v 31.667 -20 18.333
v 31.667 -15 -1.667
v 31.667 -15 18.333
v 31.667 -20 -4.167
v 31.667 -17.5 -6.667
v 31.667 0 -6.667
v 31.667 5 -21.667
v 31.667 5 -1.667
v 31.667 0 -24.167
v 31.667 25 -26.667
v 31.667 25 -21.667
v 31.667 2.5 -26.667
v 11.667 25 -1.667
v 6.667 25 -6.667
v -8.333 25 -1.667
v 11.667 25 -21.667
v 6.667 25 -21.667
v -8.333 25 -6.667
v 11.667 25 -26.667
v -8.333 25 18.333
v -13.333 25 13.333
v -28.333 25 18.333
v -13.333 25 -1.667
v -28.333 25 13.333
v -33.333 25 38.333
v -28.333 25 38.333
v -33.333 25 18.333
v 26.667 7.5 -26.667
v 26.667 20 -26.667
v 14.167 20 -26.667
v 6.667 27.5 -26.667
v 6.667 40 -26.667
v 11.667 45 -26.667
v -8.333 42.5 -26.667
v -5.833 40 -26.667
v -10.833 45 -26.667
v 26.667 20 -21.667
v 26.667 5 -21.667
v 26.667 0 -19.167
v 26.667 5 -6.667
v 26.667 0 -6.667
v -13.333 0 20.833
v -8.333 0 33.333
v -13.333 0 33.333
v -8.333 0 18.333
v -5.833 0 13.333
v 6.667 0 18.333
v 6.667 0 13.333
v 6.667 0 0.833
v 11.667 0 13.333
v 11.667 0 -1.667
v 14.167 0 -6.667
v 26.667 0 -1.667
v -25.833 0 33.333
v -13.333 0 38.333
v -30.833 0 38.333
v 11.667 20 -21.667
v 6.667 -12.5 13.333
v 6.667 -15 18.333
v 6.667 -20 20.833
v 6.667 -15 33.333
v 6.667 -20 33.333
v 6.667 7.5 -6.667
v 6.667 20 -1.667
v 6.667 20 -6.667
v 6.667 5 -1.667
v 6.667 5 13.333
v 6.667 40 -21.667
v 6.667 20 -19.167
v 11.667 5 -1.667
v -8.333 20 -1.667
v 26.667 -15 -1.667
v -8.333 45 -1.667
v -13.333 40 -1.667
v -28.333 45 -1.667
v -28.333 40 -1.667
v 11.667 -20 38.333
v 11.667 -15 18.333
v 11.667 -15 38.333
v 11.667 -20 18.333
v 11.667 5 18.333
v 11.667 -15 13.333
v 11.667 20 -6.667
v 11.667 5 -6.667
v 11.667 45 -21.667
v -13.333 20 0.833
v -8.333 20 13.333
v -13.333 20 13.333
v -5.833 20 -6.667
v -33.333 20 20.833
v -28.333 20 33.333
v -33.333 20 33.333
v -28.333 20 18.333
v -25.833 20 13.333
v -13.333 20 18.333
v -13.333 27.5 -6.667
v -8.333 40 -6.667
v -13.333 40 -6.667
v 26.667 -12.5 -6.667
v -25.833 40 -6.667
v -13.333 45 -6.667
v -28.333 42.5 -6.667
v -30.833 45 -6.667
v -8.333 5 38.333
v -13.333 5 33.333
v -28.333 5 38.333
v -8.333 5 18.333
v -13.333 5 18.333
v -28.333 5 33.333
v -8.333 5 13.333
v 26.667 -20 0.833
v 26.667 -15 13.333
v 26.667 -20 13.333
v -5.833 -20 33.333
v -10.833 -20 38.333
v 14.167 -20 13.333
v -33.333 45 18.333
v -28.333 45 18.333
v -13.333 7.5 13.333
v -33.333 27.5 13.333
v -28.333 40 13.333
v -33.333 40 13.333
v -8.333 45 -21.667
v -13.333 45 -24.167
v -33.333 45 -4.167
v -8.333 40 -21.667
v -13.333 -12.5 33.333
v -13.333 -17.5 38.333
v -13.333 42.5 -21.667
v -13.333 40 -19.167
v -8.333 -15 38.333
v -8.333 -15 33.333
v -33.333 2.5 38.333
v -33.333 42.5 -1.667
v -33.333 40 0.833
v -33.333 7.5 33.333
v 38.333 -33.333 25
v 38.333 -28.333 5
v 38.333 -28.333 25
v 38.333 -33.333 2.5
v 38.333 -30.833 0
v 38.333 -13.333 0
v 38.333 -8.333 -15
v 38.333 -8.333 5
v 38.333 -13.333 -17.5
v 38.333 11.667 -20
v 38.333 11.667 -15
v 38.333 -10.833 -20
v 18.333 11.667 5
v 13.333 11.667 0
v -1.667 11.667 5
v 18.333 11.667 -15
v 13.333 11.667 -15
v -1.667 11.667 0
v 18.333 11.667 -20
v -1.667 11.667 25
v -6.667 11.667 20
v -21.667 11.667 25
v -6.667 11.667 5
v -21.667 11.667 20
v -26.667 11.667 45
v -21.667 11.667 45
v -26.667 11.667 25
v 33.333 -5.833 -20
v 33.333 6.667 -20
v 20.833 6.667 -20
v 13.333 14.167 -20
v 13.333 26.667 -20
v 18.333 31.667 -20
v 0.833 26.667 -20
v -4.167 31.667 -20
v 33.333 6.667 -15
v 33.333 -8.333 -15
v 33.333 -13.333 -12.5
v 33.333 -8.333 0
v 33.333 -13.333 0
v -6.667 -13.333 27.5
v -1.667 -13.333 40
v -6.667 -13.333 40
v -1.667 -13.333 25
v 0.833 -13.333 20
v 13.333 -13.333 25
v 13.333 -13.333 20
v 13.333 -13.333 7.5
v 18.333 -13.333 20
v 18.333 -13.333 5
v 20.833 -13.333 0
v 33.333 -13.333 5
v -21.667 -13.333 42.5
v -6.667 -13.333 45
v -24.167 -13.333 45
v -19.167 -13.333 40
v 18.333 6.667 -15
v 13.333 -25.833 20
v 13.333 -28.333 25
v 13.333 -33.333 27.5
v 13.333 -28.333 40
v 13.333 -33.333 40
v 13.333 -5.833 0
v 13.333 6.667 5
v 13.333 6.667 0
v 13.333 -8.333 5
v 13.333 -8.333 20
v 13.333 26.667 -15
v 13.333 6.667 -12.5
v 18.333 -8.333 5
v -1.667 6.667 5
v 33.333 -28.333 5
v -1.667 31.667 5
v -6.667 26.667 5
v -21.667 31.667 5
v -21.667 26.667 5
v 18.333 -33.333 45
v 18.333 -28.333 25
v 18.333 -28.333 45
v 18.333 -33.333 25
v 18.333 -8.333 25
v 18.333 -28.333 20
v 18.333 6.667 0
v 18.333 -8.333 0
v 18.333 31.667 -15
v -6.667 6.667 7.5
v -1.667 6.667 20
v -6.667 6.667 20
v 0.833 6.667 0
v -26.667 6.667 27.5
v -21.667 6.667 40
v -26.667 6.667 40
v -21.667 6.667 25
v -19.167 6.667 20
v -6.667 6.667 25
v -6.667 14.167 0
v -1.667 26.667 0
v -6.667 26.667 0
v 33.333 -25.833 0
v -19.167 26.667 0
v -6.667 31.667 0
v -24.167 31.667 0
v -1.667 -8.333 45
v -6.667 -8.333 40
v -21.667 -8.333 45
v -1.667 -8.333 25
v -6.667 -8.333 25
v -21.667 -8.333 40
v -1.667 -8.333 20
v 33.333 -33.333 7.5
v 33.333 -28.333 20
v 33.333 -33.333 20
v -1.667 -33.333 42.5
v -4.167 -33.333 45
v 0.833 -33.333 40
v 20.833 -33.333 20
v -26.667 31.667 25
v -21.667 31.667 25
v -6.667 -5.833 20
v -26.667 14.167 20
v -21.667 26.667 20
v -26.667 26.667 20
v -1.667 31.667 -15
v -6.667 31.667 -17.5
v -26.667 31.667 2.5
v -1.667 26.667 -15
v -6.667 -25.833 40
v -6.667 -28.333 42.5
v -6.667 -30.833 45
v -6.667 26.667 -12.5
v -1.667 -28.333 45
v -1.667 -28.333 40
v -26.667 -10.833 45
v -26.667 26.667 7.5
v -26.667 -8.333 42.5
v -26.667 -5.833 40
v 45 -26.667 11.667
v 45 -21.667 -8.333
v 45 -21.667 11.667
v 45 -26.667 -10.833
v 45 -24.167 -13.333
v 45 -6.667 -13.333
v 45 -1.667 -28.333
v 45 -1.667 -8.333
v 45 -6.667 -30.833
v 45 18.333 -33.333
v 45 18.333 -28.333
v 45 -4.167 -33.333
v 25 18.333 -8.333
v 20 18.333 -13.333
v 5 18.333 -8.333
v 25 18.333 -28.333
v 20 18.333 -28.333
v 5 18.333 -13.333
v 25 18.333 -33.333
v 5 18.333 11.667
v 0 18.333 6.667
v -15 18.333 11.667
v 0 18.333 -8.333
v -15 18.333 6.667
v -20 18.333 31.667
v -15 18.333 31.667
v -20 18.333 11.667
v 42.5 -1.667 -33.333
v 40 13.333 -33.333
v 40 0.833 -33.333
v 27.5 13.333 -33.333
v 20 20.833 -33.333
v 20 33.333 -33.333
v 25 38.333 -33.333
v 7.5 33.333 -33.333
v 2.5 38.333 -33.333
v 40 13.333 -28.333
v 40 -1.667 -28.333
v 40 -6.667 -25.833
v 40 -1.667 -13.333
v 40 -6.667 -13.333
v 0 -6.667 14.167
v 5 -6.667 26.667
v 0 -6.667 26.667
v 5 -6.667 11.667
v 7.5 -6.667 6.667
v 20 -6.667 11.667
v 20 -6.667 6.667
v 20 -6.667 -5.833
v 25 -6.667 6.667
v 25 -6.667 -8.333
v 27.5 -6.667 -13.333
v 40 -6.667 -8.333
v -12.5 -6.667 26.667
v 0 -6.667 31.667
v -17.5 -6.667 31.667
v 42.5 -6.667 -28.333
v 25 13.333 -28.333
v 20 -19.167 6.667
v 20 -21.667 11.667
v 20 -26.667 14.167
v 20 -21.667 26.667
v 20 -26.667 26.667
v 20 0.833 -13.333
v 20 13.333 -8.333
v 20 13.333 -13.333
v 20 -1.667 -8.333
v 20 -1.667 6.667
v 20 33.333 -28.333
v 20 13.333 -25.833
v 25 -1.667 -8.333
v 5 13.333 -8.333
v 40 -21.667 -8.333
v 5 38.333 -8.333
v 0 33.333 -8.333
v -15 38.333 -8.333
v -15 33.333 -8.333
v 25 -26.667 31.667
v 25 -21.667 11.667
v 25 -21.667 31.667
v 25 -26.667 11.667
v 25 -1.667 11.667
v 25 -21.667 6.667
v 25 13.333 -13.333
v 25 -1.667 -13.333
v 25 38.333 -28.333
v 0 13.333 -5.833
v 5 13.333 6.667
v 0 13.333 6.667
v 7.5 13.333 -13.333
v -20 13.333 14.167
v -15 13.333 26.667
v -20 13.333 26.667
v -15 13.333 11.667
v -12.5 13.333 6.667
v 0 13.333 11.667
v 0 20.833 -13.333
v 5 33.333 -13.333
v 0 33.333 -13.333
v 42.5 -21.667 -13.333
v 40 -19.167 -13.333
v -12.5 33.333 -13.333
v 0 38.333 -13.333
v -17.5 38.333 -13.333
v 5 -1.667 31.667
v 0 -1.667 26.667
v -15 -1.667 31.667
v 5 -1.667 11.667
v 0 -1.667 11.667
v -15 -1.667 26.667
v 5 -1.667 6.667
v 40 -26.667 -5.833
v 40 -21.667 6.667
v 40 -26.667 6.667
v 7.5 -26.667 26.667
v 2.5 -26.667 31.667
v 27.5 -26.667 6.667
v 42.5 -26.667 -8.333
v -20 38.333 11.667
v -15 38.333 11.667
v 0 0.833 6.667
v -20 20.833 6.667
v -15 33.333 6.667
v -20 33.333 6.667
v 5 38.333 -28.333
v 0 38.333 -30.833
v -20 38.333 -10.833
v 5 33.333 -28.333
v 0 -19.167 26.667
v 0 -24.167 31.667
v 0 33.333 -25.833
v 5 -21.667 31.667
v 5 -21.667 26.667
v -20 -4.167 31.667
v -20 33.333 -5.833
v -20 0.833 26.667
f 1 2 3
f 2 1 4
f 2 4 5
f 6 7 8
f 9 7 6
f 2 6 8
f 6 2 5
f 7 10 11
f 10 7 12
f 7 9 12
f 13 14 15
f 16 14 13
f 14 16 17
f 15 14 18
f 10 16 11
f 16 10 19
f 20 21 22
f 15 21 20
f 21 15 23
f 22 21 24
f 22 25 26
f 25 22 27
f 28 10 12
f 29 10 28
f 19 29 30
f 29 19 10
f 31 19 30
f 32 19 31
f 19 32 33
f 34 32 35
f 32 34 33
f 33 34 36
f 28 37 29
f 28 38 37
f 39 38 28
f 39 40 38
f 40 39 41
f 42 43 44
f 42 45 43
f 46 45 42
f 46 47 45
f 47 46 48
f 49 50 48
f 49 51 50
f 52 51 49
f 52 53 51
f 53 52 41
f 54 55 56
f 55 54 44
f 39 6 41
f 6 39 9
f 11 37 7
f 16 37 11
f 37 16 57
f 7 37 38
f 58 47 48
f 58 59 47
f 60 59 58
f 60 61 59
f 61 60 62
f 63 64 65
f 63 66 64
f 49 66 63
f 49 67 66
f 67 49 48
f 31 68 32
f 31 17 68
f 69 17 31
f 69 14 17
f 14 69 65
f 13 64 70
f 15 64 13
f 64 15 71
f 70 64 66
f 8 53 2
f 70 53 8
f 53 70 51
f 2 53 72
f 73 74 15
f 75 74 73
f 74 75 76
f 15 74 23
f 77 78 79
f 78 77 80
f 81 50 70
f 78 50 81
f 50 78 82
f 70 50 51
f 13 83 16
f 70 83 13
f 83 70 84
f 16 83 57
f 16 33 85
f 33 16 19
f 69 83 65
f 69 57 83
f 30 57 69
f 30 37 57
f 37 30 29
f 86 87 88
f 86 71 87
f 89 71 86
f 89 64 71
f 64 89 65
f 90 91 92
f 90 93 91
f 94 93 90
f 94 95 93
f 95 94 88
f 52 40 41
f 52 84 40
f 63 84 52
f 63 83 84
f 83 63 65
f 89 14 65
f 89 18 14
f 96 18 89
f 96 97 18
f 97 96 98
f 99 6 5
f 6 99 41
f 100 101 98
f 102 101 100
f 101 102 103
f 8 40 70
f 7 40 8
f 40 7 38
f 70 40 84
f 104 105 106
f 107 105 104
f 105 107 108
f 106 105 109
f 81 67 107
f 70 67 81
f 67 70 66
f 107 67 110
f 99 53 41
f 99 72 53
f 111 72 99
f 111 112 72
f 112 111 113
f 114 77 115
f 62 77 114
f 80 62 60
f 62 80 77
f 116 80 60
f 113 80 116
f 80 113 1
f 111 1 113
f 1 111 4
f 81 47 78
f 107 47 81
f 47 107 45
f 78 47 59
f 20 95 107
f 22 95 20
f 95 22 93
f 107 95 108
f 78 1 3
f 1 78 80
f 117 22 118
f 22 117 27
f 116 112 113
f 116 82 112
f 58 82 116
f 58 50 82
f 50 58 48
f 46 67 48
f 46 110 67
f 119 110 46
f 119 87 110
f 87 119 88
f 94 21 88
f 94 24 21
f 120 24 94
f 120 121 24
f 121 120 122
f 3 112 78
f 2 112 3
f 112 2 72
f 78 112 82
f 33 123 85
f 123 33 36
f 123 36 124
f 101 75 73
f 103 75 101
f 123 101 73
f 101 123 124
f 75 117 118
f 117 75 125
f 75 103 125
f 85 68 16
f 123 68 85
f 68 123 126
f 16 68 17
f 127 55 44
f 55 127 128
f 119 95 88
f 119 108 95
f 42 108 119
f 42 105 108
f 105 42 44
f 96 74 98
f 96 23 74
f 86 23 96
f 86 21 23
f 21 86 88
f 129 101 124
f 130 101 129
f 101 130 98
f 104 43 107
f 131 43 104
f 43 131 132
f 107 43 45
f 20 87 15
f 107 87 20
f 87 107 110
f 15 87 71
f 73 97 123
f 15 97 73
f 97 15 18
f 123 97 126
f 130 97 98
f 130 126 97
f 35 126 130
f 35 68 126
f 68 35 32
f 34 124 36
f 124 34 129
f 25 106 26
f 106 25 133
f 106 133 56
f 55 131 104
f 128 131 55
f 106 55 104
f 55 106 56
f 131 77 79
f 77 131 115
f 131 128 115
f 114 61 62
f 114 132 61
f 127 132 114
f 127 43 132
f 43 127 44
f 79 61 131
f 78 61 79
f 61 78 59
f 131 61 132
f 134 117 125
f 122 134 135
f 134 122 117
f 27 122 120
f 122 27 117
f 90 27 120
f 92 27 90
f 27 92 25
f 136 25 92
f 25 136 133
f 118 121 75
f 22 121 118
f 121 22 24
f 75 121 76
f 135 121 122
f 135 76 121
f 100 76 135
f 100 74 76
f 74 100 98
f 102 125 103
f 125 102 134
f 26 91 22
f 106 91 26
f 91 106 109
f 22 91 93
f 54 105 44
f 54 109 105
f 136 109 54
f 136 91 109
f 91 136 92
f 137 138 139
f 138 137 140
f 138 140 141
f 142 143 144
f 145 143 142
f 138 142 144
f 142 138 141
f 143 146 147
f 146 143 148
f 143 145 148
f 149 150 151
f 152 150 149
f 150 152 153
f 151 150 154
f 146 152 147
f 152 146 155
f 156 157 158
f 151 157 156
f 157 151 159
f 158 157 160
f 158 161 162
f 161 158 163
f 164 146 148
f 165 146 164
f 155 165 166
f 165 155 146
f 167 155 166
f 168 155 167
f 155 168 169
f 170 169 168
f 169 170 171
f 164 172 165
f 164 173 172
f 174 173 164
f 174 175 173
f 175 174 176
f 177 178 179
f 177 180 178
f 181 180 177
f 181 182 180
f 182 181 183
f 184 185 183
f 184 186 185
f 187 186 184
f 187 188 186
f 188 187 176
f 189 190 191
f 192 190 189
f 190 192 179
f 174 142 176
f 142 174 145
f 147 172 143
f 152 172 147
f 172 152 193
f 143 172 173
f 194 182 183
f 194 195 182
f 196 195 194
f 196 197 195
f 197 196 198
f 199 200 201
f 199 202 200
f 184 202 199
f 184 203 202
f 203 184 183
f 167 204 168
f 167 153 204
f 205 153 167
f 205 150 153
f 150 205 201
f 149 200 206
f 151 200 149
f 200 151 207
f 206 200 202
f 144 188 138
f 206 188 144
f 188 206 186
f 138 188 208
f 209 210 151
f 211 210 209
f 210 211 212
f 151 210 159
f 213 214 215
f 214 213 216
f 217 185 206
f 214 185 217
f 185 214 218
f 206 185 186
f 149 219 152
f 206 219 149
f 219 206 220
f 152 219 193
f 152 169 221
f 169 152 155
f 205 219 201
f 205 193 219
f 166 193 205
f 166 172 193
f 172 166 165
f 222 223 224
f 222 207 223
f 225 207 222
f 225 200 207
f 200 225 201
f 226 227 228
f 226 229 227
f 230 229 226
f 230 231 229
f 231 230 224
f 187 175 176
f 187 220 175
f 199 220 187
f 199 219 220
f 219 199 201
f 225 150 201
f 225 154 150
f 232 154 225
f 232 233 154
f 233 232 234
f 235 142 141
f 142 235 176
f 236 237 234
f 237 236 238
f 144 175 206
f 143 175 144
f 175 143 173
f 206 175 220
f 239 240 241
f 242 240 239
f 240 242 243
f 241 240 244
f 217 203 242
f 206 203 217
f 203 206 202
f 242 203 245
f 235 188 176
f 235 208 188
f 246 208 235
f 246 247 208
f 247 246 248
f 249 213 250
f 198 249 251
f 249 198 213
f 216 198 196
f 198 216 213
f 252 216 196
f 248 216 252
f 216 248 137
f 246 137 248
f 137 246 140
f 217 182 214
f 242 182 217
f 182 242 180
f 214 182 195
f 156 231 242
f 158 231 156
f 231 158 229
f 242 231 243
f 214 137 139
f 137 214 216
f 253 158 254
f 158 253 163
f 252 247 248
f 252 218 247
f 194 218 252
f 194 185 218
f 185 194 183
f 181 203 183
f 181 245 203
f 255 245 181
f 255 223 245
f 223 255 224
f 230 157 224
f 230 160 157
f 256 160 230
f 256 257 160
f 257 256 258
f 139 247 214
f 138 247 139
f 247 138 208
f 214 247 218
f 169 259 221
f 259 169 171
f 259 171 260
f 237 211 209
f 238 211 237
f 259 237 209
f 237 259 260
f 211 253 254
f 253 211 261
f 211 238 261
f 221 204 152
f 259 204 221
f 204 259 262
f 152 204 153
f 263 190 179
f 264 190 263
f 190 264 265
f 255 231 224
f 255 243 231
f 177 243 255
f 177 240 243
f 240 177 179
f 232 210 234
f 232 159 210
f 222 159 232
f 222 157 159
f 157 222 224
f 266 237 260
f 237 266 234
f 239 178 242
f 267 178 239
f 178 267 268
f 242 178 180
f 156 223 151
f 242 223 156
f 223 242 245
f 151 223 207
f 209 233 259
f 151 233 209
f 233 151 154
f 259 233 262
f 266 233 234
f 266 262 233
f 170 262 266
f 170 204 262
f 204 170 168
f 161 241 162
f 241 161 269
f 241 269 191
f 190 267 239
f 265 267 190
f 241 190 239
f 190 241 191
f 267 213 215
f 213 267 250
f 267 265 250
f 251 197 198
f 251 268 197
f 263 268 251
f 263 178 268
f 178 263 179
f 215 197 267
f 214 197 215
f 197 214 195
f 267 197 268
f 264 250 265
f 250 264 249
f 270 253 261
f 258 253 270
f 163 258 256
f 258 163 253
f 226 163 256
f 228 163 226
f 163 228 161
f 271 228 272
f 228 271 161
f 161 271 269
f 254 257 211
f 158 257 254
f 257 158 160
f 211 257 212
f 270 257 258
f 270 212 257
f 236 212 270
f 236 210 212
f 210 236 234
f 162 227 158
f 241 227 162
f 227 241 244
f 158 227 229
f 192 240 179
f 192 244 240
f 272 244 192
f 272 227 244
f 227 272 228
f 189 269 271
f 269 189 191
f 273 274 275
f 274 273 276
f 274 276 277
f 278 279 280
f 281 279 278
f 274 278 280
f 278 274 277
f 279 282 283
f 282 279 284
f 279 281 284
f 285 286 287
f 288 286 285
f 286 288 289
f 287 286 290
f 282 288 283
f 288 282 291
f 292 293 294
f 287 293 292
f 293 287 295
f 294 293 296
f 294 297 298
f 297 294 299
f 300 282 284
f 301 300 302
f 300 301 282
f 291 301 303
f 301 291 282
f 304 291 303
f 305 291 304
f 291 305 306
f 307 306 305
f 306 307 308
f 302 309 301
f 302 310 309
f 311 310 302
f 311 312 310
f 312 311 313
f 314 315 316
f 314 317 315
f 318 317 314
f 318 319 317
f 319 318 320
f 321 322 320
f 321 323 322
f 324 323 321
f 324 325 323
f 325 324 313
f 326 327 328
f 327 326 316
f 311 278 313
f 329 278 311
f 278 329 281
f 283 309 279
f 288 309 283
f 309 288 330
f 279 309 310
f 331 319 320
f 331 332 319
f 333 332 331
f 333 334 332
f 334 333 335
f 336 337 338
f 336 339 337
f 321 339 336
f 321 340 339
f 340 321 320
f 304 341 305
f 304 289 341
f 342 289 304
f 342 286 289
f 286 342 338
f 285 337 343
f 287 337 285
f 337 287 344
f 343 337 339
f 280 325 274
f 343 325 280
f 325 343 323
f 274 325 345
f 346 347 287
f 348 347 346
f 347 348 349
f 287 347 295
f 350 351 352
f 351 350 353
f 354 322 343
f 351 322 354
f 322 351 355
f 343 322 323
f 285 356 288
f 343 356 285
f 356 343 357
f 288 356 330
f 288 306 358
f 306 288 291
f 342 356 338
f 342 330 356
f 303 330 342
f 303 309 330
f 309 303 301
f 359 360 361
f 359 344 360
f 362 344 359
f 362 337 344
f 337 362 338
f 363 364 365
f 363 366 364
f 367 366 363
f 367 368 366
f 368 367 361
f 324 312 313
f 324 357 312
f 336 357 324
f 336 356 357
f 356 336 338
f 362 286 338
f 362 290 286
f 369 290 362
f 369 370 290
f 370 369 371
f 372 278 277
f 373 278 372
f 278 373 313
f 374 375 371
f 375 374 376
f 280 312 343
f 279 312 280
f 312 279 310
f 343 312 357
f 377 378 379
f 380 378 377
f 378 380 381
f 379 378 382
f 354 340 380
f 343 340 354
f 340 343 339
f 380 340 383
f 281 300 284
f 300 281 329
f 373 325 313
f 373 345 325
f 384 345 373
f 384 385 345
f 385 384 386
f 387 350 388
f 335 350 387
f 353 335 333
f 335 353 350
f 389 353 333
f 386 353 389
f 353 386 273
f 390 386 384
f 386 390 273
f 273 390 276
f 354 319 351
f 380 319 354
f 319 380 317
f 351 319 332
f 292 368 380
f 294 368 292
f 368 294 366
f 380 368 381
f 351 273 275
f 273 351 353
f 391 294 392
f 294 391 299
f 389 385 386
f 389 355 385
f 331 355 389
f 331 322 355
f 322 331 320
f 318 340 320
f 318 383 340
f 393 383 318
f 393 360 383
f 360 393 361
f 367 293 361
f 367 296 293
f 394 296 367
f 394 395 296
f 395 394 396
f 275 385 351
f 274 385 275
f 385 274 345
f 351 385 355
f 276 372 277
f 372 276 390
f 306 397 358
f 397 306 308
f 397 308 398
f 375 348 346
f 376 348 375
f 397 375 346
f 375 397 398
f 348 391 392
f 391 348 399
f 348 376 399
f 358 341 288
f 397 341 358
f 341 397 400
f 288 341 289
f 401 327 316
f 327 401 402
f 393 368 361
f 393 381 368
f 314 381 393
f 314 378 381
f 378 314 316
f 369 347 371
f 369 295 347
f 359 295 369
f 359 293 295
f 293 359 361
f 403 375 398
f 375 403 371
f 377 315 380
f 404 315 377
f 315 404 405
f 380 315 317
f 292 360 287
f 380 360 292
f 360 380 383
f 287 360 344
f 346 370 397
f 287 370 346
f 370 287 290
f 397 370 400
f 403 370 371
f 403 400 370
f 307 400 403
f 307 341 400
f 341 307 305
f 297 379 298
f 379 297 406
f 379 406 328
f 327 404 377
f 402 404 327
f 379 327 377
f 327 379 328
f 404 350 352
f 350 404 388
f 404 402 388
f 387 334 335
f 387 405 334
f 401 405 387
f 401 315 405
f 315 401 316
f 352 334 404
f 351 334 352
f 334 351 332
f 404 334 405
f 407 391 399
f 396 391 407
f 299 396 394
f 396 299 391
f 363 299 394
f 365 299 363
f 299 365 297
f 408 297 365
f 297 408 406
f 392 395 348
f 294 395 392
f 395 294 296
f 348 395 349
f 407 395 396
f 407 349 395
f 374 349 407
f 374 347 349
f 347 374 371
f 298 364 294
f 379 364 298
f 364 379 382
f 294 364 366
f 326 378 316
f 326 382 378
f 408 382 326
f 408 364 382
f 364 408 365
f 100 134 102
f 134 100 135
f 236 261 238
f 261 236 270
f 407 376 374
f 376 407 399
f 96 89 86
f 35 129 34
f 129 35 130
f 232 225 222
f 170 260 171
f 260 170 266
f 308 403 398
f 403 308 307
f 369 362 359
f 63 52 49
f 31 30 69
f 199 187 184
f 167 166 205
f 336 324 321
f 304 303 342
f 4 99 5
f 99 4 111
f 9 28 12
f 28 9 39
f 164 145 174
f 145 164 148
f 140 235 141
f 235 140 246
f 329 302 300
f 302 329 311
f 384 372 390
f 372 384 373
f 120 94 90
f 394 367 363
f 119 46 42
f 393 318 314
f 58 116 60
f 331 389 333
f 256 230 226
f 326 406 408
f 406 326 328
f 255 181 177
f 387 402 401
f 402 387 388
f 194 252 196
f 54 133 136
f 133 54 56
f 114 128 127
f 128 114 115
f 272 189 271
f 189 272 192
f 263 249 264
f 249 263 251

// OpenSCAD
count=1;
thickness = 5;
spacing = 20;

module drawcubes(list, spacing=spacing, thickness=thickness){
    for(xyz12=list){
        xyz0=xyz12[0]*spacing;
        xyz1=xyz12[1]*spacing;
        hull(){
            translate([xyz0.x, xyz0.y, xyz0.z])
                cube(thickness, center=true);
            translate([xyz1.x, xyz1.y, xyz1.z])
                cube(thickness, center=true);
        }
    }
}
module ring(){
    difference(){
        drawcubes([
            [[1,1,0],[1,0,0]],
            [[0,1,1],[0,1,0]],
            [[1,0,1],[0,0,1]],
            [[1,0,1],[1,0,0]],
            [[1,1,0],[0,1,0]],
            [[0,1,1],[0,0,1]],
        ]);
        translate([-1,-1,-1]*(spacing/3+thickness/2)) hull(){
            translate([-2,2,2]*(spacing)) cube(thickness, center=true);
            translate([2,-2,2]*(spacing)) cube(thickness, center=true);
            translate([2,2,-2]*(spacing)) cube(thickness, center=true);
        }
    }
}

module parta(count=count) 
    for(x=[-count:count], y=[-count:count])
{
    if (abs(x-y)<count+1)
        translate([-1,1,0]*spacing*x + [0,-1,1]*spacing*y)
        children();
}


difference(){
    translate([1,1,1]*(-spacing/3+thickness/2)){
        color("red")
            translate([-1,1,0]*spacing/3)
            parta(){ring();}
        color("green")
            translate([0,-1,1]*spacing/3)
            parta(){ring();}
        color("blue")
            translate([1,0,-1]*spacing/3)
            parta(){ring();}
    }
    hull(){
        translate([-2,1,1]*(count+1)*spacing) cube(thickness, center=true);
        translate([1,-2,1]*(count+1)*spacing) cube(thickness, center=true);
        translate([1,1,-2]*(count+1)*spacing) cube(thickness, center=true);
    }
}
